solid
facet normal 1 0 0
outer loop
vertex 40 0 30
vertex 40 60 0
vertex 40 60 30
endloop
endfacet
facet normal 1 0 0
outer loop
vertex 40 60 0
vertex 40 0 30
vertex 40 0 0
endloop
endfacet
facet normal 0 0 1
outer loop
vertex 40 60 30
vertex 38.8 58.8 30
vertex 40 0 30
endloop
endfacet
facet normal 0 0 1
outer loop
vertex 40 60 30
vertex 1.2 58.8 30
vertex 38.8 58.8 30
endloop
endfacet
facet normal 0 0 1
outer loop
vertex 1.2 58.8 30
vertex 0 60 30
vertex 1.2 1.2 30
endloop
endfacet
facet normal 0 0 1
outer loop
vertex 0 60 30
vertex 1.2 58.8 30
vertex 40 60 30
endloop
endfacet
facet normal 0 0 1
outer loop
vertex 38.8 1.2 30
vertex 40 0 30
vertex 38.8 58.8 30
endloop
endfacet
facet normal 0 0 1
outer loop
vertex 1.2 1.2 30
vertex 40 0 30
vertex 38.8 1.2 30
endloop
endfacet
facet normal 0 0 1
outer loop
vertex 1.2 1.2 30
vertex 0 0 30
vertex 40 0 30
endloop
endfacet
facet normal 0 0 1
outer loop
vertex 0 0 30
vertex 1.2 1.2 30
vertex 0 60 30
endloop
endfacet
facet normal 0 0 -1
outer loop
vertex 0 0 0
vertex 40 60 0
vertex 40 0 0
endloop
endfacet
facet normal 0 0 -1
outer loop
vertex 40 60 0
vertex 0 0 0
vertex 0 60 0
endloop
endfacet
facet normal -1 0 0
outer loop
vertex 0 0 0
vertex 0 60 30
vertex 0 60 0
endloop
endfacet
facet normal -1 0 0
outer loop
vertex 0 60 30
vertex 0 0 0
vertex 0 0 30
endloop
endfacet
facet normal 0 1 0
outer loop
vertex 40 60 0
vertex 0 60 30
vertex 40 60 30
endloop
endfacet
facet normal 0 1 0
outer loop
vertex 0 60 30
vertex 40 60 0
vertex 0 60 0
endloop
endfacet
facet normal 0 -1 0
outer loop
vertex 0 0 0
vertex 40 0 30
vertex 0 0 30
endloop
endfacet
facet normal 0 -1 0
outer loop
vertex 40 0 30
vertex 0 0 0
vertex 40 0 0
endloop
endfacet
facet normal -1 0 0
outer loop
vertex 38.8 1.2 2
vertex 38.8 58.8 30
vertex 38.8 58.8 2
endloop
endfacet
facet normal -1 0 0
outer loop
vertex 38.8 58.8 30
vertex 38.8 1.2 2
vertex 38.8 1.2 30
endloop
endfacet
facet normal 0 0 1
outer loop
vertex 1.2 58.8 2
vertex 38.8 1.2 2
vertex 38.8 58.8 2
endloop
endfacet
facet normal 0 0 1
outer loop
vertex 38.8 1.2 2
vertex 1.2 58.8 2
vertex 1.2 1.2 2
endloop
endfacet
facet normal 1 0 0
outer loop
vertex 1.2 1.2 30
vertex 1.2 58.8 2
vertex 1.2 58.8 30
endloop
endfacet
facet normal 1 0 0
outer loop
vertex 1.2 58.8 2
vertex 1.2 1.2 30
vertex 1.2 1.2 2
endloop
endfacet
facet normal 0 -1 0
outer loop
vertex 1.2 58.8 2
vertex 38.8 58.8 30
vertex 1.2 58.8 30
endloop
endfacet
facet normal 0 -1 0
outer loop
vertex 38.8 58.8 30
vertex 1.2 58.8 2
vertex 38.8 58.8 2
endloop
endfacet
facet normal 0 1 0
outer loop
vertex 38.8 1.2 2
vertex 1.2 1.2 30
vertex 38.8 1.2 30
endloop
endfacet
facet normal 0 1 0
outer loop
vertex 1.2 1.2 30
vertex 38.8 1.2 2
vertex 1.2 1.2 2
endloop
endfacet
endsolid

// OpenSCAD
$fn = 32;

// ----------------------------------------------------------------------
// Open box: 1.2 mm walls
// ----------------------------------------------------------------------

// --- parameters (mm) ---
box_l = 40;               // outer length, X
box_w = 60;               // outer width, Y
box_h = 30;               // outer height, Z
wall = 1.2;               // wall thickness
floor = 2;                // floor thickness

difference() {
  cube([box_l, box_w, box_h]);
  translate([wall, wall, floor])
    cube([box_l - 2 * wall, box_w - 2 * wall, box_h]);
}
